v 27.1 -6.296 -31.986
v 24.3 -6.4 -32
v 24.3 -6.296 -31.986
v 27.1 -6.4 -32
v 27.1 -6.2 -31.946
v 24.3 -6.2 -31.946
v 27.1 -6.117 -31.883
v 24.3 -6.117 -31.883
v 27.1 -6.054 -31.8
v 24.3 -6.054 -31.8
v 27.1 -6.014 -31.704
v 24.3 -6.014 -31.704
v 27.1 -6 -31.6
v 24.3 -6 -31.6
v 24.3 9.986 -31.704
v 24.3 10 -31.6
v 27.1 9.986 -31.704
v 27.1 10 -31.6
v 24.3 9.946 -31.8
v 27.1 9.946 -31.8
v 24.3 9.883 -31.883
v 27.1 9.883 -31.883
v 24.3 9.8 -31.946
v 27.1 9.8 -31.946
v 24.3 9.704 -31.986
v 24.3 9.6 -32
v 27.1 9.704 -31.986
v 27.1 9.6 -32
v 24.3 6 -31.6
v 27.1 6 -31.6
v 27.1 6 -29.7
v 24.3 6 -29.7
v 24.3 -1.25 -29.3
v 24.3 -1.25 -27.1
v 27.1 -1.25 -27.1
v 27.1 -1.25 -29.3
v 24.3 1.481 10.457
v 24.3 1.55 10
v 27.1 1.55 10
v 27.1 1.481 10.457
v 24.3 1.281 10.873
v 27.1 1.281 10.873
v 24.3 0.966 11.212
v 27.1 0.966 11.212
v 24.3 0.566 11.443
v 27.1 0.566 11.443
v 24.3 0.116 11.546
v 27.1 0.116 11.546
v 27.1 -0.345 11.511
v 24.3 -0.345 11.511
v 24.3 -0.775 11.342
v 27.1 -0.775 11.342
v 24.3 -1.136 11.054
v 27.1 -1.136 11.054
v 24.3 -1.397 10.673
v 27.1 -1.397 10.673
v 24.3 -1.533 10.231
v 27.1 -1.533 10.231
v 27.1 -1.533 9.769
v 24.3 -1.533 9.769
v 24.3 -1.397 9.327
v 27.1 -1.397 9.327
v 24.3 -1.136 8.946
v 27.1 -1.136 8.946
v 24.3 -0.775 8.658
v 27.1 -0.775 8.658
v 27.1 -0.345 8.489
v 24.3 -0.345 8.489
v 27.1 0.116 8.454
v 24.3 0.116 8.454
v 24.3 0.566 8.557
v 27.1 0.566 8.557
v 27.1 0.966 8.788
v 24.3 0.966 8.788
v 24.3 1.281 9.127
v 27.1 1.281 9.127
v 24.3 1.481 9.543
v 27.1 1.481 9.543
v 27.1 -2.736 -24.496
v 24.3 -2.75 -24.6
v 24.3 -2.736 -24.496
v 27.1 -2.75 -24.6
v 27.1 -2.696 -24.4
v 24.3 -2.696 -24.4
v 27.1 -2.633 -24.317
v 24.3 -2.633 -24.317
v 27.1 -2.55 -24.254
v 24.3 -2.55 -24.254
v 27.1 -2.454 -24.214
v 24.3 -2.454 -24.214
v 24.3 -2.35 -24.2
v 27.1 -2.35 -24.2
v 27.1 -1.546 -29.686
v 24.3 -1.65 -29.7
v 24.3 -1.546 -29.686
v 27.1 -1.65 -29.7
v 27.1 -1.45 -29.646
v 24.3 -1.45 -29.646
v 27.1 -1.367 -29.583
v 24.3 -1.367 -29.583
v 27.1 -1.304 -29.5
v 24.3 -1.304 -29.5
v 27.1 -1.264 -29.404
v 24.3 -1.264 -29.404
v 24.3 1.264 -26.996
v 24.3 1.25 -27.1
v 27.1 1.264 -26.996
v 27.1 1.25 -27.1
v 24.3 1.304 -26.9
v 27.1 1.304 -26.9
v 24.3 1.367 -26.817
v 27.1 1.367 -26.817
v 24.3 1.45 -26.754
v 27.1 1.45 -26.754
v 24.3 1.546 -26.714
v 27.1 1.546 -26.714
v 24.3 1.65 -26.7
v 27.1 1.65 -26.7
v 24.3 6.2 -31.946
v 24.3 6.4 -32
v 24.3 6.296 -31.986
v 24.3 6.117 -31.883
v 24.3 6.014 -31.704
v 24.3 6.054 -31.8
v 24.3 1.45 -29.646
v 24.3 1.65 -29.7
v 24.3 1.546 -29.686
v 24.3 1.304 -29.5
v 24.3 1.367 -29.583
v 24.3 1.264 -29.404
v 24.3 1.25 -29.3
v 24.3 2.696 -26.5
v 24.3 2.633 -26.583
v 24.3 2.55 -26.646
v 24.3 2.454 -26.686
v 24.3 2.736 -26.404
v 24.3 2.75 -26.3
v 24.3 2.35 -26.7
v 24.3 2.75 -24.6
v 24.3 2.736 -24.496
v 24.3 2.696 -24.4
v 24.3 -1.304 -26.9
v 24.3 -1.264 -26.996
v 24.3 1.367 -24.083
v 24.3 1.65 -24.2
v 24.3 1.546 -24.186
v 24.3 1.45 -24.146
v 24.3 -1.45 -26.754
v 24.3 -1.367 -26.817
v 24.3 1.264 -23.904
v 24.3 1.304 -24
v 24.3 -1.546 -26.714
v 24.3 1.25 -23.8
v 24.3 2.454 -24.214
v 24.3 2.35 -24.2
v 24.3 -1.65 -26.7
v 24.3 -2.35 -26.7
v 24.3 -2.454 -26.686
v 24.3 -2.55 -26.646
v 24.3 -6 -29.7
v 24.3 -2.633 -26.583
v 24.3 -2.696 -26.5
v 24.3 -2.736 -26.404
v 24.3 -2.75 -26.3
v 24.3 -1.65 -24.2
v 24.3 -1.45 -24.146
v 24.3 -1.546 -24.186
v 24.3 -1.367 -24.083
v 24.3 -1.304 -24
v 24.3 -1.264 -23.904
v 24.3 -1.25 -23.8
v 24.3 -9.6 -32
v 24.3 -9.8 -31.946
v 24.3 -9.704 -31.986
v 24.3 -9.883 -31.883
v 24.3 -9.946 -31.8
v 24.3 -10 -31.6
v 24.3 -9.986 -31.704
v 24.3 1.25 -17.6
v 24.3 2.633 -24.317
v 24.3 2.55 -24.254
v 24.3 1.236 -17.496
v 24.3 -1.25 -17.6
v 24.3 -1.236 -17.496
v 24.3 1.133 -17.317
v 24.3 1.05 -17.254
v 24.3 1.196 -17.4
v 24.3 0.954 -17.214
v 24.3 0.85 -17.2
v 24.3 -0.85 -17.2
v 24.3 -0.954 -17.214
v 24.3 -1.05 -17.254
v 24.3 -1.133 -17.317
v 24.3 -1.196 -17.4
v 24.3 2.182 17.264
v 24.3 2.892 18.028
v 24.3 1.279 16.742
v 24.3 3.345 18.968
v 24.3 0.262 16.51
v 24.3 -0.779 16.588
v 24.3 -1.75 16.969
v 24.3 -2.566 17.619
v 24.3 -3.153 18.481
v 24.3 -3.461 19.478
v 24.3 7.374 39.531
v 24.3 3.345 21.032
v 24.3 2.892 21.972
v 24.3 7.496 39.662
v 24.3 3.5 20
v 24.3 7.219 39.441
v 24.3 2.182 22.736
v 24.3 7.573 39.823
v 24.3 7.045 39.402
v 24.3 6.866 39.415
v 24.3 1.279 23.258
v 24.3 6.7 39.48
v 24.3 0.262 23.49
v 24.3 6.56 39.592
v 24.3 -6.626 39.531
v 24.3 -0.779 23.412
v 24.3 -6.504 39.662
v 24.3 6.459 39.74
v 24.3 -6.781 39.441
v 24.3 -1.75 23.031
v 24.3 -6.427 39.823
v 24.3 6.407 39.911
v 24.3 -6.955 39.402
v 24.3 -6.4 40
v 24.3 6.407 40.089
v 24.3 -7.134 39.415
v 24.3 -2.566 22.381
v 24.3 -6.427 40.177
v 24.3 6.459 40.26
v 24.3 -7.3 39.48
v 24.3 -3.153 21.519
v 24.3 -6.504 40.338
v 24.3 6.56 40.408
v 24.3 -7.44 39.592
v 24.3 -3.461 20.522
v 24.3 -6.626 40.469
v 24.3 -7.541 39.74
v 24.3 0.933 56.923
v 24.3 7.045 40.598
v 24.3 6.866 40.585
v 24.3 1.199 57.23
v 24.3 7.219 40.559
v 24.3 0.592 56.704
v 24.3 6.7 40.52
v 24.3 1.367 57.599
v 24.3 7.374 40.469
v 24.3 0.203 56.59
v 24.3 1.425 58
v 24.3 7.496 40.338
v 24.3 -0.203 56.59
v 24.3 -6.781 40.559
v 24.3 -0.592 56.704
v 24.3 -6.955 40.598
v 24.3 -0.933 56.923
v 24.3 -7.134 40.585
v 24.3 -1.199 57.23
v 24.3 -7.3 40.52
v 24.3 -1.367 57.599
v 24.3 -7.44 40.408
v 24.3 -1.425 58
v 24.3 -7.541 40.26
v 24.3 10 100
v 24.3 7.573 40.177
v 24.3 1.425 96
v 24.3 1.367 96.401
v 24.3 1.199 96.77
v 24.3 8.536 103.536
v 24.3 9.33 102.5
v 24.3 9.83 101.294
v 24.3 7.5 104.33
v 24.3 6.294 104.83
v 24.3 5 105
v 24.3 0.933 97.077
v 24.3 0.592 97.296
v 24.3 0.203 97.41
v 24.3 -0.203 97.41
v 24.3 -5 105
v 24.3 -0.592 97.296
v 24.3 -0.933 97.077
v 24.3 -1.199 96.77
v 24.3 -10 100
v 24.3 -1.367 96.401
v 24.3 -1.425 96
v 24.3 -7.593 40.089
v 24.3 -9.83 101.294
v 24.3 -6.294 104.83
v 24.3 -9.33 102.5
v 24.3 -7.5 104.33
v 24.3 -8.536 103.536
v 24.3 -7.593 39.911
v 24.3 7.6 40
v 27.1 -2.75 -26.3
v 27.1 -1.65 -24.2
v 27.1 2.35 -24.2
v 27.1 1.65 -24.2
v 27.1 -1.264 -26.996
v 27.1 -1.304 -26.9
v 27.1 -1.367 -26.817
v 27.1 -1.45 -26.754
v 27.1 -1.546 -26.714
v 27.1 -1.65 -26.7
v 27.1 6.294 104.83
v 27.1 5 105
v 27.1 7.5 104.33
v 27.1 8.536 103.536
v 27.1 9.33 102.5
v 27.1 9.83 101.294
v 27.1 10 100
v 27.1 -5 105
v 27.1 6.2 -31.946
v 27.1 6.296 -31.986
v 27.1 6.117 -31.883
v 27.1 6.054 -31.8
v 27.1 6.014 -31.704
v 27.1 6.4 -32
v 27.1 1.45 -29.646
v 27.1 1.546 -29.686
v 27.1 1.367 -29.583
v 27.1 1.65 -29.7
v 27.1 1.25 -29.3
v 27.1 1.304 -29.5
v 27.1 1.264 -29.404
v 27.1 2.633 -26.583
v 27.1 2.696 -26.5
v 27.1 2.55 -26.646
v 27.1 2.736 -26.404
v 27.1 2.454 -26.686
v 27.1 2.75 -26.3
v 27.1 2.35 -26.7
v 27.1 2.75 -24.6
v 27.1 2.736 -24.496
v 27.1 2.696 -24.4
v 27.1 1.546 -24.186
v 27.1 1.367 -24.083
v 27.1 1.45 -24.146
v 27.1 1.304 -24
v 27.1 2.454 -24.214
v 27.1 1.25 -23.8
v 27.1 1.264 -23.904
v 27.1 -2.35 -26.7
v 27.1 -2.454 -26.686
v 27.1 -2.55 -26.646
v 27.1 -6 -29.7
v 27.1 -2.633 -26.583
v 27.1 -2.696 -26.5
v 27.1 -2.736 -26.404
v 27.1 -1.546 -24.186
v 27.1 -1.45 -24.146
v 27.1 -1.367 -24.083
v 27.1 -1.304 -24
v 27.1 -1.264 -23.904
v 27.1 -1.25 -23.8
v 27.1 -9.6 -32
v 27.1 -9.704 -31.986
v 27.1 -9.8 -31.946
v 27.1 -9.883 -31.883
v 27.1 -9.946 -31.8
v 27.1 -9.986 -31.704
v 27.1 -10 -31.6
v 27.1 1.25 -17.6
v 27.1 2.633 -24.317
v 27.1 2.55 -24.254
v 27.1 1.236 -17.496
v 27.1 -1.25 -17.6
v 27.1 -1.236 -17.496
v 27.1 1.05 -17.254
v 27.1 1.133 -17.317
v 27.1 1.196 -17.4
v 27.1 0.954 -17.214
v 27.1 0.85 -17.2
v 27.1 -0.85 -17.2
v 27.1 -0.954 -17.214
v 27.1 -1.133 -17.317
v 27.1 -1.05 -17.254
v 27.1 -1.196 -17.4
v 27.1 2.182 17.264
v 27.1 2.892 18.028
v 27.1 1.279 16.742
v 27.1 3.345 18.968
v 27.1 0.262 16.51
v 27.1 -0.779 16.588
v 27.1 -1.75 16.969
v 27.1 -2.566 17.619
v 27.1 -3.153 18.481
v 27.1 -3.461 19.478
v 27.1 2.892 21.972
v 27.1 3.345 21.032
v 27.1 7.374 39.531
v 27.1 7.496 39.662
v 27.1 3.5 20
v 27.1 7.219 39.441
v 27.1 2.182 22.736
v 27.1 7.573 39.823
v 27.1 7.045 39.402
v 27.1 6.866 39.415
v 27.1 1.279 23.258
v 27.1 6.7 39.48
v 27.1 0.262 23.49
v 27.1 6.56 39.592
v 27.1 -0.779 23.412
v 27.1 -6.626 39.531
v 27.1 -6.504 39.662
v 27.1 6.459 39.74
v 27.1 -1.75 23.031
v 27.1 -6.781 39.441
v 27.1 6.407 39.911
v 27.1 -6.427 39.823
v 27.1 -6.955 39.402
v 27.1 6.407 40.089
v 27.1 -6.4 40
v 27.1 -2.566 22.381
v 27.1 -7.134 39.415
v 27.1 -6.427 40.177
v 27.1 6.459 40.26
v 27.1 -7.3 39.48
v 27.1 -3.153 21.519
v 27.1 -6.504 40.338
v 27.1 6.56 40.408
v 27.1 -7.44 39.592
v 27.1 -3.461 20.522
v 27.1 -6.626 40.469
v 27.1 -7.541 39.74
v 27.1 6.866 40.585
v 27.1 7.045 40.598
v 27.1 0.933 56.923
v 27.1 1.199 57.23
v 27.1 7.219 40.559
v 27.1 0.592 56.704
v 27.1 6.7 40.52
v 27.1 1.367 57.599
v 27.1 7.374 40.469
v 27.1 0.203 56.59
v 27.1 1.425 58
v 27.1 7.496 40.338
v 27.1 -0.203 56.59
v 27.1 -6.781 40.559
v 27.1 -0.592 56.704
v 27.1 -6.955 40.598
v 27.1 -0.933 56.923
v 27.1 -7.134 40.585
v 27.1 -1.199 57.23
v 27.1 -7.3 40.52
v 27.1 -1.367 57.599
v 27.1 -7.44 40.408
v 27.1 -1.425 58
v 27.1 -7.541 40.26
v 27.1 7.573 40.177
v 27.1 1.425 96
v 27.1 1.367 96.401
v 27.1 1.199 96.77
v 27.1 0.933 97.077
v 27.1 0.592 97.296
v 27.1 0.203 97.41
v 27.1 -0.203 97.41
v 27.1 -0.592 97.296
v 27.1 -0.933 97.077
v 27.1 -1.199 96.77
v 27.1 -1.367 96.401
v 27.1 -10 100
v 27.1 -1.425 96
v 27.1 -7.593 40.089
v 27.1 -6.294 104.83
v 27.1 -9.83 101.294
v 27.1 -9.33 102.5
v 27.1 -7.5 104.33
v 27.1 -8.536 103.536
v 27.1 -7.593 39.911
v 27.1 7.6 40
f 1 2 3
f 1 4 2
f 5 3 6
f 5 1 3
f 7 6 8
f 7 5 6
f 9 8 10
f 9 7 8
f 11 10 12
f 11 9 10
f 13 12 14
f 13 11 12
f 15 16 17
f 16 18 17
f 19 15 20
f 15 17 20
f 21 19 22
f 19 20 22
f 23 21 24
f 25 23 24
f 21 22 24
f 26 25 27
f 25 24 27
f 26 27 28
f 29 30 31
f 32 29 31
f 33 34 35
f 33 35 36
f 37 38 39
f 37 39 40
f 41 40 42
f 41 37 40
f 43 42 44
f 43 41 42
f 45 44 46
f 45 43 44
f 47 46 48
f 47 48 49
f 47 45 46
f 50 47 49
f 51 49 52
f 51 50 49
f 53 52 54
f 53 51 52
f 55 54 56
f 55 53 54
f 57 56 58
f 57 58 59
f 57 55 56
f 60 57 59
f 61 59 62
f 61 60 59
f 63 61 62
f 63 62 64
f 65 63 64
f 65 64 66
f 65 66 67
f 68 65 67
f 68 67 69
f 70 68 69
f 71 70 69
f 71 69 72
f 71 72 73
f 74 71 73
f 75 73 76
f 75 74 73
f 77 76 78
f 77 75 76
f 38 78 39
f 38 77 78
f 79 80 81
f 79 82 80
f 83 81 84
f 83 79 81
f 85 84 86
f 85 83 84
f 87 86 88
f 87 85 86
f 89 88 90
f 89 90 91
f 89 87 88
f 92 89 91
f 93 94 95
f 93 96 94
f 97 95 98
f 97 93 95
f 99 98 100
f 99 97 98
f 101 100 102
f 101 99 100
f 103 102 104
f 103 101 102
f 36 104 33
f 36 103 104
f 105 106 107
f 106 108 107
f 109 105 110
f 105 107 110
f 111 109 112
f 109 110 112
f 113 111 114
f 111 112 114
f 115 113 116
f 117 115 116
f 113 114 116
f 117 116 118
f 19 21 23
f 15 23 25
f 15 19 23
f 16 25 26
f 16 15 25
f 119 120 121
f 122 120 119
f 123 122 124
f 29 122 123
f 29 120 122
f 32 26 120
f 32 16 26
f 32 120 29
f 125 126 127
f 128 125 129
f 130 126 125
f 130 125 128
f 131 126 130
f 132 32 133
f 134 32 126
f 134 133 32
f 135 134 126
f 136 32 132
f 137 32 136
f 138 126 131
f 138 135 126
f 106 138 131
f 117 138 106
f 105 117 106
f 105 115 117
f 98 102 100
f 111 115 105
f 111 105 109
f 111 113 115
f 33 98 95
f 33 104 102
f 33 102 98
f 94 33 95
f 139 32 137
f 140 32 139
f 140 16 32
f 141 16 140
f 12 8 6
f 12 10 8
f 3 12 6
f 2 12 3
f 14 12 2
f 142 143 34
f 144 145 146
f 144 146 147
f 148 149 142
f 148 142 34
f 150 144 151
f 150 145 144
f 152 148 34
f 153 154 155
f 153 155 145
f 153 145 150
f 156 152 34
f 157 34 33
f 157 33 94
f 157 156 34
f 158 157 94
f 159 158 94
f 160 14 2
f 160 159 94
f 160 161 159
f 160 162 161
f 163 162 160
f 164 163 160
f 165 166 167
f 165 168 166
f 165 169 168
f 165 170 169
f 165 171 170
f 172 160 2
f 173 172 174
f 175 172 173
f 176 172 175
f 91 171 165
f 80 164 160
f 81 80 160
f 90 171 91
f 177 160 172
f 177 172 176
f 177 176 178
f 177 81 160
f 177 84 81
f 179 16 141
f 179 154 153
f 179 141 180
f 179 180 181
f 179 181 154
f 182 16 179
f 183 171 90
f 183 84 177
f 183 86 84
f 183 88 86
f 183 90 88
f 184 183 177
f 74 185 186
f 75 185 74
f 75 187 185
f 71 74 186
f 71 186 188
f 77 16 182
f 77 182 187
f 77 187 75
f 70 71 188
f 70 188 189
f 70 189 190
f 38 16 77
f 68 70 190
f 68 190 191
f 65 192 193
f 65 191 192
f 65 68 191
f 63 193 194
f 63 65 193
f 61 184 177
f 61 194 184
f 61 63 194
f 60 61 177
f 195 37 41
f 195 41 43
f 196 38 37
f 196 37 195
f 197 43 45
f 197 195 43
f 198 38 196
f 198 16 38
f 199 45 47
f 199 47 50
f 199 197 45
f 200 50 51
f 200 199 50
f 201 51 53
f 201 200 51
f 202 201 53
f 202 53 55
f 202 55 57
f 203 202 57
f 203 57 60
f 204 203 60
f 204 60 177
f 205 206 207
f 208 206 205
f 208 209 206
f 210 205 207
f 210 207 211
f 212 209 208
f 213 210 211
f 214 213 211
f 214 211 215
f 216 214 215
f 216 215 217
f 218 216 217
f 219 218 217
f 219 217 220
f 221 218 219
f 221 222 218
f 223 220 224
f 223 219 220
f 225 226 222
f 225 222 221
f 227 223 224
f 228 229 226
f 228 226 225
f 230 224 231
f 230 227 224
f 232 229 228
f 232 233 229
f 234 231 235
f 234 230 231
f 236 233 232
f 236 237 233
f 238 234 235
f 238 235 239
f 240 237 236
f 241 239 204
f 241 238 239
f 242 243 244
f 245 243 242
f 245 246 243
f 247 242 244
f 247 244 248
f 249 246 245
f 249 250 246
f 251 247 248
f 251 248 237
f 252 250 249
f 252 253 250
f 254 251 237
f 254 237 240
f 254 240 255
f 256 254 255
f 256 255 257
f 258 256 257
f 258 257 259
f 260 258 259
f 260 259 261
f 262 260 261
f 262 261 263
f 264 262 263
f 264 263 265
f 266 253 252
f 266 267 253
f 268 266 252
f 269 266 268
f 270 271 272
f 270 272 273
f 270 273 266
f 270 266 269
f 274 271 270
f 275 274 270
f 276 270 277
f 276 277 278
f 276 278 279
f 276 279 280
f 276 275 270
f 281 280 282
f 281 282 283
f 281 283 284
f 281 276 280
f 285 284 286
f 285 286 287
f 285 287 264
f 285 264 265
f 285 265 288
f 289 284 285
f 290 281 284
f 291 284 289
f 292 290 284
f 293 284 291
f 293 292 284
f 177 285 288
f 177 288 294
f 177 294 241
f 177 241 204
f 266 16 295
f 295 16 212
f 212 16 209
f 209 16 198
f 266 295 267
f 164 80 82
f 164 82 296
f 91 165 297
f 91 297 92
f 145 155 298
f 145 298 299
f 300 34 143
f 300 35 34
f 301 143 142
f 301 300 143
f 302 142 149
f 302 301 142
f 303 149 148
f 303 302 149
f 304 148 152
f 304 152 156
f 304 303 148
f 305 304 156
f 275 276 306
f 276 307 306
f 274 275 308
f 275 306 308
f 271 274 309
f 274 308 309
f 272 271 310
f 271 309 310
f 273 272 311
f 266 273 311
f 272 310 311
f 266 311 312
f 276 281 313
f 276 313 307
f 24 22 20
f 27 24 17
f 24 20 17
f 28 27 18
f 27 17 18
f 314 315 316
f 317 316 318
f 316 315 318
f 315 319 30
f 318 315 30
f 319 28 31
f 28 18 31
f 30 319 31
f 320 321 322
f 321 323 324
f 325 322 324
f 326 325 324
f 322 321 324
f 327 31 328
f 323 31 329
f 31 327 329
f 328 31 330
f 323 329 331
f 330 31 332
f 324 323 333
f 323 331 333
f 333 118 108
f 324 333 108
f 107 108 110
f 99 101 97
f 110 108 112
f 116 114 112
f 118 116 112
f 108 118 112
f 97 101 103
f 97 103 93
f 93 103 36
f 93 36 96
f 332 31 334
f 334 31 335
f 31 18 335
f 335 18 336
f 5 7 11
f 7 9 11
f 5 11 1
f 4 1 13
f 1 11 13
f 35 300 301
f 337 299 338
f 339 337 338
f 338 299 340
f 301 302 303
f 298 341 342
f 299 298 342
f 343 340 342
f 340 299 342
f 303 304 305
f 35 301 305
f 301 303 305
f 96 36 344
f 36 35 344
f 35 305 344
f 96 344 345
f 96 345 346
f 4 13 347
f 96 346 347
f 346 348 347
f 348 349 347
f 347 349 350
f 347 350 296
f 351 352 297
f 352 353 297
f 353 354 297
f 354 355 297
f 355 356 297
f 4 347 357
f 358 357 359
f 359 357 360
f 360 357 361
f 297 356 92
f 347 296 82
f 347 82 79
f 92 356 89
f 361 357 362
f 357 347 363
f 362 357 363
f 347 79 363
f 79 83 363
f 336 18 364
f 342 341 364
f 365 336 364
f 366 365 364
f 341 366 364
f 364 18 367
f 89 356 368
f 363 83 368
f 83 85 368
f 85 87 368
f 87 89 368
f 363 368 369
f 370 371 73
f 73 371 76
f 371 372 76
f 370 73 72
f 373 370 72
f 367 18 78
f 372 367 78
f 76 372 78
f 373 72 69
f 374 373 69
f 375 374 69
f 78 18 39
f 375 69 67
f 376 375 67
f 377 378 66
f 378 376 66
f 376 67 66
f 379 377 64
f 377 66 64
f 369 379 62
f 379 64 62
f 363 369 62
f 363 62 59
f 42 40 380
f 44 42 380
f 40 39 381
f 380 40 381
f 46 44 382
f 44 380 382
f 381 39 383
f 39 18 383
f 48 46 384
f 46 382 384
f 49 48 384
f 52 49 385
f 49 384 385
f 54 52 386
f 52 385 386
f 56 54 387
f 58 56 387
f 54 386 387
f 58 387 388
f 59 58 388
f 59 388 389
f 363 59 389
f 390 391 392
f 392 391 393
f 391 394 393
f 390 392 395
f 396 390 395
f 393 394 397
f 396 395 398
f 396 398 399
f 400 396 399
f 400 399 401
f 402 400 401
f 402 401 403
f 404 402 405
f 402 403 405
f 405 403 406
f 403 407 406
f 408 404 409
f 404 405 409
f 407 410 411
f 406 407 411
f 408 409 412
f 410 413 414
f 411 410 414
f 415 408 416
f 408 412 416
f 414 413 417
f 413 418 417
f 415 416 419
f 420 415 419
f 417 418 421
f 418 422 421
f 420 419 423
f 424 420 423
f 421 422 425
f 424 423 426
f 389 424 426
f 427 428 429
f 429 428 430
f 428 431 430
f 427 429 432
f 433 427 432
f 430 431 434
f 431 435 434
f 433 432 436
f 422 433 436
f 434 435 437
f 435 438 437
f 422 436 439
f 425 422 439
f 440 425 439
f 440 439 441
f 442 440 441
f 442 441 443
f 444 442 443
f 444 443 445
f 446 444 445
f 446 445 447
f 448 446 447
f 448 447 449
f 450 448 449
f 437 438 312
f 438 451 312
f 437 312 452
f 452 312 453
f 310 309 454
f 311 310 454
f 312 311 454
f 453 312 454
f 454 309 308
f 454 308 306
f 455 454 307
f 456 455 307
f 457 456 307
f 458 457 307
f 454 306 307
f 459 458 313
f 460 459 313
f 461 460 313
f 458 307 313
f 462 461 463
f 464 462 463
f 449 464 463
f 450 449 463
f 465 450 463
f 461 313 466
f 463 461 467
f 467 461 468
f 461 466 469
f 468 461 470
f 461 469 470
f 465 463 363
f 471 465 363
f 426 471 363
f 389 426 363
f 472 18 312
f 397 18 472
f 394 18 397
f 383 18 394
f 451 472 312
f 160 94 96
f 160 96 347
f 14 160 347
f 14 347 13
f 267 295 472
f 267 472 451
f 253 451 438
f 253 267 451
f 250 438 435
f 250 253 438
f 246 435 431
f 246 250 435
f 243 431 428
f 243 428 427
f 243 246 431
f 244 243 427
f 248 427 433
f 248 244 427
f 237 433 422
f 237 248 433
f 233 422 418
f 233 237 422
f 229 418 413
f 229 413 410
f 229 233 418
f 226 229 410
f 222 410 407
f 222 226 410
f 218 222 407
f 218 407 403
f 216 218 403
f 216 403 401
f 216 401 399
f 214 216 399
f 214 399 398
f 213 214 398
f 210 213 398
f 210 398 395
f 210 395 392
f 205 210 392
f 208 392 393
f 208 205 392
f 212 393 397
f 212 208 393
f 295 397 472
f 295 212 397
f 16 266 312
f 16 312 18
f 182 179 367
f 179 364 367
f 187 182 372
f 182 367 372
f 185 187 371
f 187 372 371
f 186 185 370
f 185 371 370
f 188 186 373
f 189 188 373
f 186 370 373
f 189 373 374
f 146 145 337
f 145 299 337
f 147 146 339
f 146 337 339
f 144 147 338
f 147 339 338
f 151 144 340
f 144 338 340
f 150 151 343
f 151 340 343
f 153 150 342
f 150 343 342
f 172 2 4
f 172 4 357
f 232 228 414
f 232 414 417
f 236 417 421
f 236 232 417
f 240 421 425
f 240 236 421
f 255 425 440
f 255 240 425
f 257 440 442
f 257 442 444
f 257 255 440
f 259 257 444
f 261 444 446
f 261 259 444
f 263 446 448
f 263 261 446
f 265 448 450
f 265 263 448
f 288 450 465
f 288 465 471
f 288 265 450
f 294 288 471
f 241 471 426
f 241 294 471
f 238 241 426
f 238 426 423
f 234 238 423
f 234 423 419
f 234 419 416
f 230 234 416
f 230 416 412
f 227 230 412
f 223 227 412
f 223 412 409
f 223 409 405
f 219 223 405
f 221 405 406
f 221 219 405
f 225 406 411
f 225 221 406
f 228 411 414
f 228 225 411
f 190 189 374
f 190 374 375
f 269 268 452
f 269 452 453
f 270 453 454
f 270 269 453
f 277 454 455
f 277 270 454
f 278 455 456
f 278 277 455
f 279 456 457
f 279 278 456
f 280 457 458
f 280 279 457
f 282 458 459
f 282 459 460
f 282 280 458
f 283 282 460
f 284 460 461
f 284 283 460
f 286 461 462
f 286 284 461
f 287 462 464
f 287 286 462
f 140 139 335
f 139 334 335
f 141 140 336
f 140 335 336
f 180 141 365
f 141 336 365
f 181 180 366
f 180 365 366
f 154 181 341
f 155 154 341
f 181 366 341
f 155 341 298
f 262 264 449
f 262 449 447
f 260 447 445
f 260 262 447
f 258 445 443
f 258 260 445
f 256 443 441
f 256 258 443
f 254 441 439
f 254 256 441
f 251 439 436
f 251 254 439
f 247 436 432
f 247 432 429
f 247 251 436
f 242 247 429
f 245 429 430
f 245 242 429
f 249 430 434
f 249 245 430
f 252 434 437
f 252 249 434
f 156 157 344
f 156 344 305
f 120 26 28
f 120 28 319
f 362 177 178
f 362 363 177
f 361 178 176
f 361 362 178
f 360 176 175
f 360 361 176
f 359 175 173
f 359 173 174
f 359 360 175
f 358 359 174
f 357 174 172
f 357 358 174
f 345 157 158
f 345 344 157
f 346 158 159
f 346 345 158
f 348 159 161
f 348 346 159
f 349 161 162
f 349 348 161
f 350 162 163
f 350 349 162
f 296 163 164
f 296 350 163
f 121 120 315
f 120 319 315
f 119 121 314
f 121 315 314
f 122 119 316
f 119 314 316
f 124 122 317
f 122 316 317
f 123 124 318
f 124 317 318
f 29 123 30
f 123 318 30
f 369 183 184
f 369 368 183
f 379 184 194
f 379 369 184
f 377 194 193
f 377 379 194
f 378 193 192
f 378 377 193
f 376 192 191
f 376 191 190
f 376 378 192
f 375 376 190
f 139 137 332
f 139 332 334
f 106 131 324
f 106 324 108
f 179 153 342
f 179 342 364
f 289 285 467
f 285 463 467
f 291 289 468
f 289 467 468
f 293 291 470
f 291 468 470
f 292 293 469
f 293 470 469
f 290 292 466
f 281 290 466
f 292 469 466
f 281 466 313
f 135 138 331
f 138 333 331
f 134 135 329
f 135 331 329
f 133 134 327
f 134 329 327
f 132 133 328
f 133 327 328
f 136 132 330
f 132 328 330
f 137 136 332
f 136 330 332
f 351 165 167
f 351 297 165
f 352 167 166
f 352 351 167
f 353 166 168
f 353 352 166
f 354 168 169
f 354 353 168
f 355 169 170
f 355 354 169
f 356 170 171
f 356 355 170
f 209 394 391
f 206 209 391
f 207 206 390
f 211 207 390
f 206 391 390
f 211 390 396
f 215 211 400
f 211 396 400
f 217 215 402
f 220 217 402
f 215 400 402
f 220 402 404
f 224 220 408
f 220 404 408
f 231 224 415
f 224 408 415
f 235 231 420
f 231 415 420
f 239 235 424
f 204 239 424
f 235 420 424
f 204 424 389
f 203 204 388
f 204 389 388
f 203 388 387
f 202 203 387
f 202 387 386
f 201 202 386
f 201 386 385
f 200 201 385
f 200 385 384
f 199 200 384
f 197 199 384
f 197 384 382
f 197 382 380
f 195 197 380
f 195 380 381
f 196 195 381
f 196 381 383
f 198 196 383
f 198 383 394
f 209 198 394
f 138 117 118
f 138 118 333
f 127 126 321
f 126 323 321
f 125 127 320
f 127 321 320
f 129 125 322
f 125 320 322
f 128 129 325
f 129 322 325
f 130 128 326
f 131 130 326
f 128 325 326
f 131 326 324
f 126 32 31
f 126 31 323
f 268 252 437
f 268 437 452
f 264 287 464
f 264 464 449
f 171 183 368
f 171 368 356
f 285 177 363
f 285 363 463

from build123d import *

# Parameters (mm, degrees)
SKETCH001_R             = 1.55
SKETCH001_R_2           = 0.6
PAD004_DEPTH            = 2.8
FILLET_R                = 0.4
FILLET001_R             = 5
SKETCH019_R             = 3.5
POCKET_DEPTH            = 2.801
BODY014_PLACEMENT_ANGLE = 180


with BuildPart() as part:
    # Sketch001 (on DatumPlane) → Pad004 (new body)
    with BuildSketch(Plane(origin=(-24.3, 0, 0), x_dir=(0, -1, 0), z_dir=(-1, 0, 0))):
        Polygon((-10, 85), (10, 85), (10, -52), (6, -52), (6, -49.7), (1.25, -49.7), (1.25, -46.7), (2.75, -46.7), (2.75, -44.2), (1.25, -44.2), (1.25, -37.2), (-1.25, -37.2), (-1.25, -44.2), (-2.75, -44.2), (-2.75, -46.7), (-1.25, -46.7), (-1.25, -49.7), (-6, -49.7), (-6, -52), (-10, -52), align=None)
        with Locations((0, -10)):
            Circle(SKETCH001_R, mode=Mode.SUBTRACT)
        with Locations((-7, 20)):
            Circle(SKETCH001_R_2, mode=Mode.SUBTRACT)
        with Locations((7, 20)):
            Circle(SKETCH001_R_2, mode=Mode.SUBTRACT)
        with BuildLine():
            ThreePointArc((1.425, 76), (0, 77.425), (-1.425, 76))
            Line((-1.425, 76), (-1.425, 38))
            ThreePointArc((-1.425, 38), (0, 36.575), (1.425, 38))
            Line((1.425, 38), (1.425, 76))
        make_face(mode=Mode.SUBTRACT)
    extrude(amount=PAD004_DEPTH)

    # Fillet
    fillet_edges = [part.edges().sort_by_distance(p)[0] for p in [
        (-25.7, 10, -52),
        (-25.7, 6, -52),
        (-25.7, -10, -52),
        (-25.7, -6, -52),
        (-25.7, 1.25, -49.7),
        (-25.7, -1.25, -49.7),
        (-25.7, 1.25, -37.2),
        (-25.7, -1.25, -37.2),
        (-25.7, 1.25, -46.7),
        (-25.7, -1.25, -46.7),
        (-25.7, 1.25, -44.2),
        (-25.7, -1.25, -44.2),
        (-25.7, -2.75, -46.7),
        (-25.7, 2.75, -46.7),
        (-25.7, 2.75, -44.2),
        (-25.7, -2.75, -44.2),
    ]]
    fillet(fillet_edges, radius=FILLET_R)

    # Fillet001
    fillet001_edges = [part.edges().sort_by_distance(p)[0] for p in [
        (-25.7, 10, 85),
        (-25.7, -10, 85),
    ]]
    fillet(fillet001_edges, radius=FILLET001_R)

    # Sketch019 (on Face47 of Fillet001) → Pocket (cut, through all)
    with BuildSketch(Plane(origin=(-27.1, 0, 0), x_dir=(0, -1, 0), z_dir=(-1, 0, 0))):
        Circle(SKETCH019_R)
    extrude(amount=-POCKET_DEPTH, mode=Mode.SUBTRACT)


with BuildPart() as part_1:
    # Body014 placement: moved
    add(part.part.moved(Location((0, 0, 20))).rotate(Axis((0, 0, 20), (0, 0, 1)), BODY014_PLACEMENT_ANGLE))


solid = part_1.part
